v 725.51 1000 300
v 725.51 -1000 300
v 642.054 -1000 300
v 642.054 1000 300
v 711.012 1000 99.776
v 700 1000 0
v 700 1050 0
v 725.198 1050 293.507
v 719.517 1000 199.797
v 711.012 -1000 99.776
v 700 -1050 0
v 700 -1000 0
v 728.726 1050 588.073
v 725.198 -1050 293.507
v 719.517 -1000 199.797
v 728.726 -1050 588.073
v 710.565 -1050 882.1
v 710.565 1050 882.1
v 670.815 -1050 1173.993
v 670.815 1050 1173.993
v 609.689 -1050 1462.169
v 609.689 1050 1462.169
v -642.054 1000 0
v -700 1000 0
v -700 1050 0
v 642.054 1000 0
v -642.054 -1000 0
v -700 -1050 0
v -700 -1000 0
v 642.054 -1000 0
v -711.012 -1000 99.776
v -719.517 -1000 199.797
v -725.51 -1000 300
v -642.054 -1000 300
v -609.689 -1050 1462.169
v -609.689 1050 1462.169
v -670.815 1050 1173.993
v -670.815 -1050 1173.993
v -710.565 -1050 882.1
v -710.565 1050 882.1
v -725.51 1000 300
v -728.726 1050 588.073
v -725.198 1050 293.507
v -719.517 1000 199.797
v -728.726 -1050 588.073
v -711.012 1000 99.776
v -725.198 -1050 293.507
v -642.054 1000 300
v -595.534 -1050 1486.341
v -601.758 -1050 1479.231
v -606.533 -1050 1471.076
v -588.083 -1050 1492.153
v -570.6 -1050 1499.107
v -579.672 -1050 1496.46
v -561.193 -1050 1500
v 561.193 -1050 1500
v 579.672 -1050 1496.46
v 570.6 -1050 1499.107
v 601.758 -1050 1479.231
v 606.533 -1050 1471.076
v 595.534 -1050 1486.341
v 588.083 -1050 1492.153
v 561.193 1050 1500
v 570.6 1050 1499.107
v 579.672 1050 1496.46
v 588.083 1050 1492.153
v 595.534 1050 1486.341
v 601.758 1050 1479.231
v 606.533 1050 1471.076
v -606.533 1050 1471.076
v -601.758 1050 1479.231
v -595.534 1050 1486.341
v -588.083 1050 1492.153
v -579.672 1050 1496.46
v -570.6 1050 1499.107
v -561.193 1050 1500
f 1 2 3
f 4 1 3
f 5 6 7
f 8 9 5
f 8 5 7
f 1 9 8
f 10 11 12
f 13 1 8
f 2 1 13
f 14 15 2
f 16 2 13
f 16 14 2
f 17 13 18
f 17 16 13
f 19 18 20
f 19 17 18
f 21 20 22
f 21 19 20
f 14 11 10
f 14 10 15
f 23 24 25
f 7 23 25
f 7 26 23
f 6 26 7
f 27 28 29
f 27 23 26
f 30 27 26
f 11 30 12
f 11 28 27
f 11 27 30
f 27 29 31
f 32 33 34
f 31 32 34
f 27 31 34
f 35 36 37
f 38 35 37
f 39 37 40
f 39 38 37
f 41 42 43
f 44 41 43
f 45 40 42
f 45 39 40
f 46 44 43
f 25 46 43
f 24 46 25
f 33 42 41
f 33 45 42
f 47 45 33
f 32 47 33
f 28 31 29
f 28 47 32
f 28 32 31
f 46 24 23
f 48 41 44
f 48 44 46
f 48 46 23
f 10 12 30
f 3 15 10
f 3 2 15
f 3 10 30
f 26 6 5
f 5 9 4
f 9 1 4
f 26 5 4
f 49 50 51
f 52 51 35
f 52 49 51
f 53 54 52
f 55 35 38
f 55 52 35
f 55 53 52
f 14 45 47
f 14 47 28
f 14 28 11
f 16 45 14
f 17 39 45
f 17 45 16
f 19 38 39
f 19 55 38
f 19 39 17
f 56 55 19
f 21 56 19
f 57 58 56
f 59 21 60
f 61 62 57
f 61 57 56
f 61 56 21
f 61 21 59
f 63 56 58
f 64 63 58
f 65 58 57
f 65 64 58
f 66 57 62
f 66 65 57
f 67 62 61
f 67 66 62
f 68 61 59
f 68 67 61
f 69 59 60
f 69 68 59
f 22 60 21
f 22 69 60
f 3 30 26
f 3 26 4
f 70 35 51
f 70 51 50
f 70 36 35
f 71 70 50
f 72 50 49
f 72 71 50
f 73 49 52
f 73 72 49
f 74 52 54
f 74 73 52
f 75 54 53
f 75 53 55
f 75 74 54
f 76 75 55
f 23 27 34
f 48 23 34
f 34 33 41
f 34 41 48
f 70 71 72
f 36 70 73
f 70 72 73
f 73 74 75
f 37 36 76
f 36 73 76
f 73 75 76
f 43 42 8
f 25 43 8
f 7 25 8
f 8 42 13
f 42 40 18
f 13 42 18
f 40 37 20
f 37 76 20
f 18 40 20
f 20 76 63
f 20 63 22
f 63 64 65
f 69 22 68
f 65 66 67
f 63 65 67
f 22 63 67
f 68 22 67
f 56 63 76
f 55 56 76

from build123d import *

# Parameters (mm, degrees)
F1_DEPTH = 1050
F2_W     = 200
F2_H     = 300
F3_DEPTH = 1000
F4_R     = 50


# Not quite as in the source:
# - a pattern or mirror of a feature is missing from the dataset's text; its kind, count and spacing are read off the source's solid


with BuildPart() as f1:
    # F0 (on Front) → F1 (new body, symmetric)
    with BuildSketch(Plane.XZ):
        with BuildLine():
            ThreePointArc((-600, 1500), (-721.1019148035, 754.7401276536), (-700, 0))
            Line((-700, 0), (700, 0))
            ThreePointArc((700, 0), (721.1019148035, 754.7401276536), (600, 1500))
            Line((600, 1500), (-600, 1500))
        make_face()
    extrude(amount=F1_DEPTH, both=True)

    # F2 (on Front) → F3 (cut, symmetric)
    with BuildSketch(Plane.XZ):
        with Locations((-742.0543789864, 150)):
            Rectangle(F2_W, F2_H)
    f3 = extrude(amount=F3_DEPTH, both=True, mode=Mode.SUBTRACT)

    # F3_copies: F3 across plane
    add(f3.mirror(Plane(origin=(0, 0, 0), x_dir=(0, 0, 1), z_dir=(1, 0, 0))), mode=Mode.SUBTRACT)

    # F4
    f4_edges = [f1.edges().sort_by_distance(p)[0] for p in [
        (600, 0, 1500),
        (-600, 0, 1500),
    ]]
    fillet(f4_edges, radius=F4_R)


solid = f1.part
